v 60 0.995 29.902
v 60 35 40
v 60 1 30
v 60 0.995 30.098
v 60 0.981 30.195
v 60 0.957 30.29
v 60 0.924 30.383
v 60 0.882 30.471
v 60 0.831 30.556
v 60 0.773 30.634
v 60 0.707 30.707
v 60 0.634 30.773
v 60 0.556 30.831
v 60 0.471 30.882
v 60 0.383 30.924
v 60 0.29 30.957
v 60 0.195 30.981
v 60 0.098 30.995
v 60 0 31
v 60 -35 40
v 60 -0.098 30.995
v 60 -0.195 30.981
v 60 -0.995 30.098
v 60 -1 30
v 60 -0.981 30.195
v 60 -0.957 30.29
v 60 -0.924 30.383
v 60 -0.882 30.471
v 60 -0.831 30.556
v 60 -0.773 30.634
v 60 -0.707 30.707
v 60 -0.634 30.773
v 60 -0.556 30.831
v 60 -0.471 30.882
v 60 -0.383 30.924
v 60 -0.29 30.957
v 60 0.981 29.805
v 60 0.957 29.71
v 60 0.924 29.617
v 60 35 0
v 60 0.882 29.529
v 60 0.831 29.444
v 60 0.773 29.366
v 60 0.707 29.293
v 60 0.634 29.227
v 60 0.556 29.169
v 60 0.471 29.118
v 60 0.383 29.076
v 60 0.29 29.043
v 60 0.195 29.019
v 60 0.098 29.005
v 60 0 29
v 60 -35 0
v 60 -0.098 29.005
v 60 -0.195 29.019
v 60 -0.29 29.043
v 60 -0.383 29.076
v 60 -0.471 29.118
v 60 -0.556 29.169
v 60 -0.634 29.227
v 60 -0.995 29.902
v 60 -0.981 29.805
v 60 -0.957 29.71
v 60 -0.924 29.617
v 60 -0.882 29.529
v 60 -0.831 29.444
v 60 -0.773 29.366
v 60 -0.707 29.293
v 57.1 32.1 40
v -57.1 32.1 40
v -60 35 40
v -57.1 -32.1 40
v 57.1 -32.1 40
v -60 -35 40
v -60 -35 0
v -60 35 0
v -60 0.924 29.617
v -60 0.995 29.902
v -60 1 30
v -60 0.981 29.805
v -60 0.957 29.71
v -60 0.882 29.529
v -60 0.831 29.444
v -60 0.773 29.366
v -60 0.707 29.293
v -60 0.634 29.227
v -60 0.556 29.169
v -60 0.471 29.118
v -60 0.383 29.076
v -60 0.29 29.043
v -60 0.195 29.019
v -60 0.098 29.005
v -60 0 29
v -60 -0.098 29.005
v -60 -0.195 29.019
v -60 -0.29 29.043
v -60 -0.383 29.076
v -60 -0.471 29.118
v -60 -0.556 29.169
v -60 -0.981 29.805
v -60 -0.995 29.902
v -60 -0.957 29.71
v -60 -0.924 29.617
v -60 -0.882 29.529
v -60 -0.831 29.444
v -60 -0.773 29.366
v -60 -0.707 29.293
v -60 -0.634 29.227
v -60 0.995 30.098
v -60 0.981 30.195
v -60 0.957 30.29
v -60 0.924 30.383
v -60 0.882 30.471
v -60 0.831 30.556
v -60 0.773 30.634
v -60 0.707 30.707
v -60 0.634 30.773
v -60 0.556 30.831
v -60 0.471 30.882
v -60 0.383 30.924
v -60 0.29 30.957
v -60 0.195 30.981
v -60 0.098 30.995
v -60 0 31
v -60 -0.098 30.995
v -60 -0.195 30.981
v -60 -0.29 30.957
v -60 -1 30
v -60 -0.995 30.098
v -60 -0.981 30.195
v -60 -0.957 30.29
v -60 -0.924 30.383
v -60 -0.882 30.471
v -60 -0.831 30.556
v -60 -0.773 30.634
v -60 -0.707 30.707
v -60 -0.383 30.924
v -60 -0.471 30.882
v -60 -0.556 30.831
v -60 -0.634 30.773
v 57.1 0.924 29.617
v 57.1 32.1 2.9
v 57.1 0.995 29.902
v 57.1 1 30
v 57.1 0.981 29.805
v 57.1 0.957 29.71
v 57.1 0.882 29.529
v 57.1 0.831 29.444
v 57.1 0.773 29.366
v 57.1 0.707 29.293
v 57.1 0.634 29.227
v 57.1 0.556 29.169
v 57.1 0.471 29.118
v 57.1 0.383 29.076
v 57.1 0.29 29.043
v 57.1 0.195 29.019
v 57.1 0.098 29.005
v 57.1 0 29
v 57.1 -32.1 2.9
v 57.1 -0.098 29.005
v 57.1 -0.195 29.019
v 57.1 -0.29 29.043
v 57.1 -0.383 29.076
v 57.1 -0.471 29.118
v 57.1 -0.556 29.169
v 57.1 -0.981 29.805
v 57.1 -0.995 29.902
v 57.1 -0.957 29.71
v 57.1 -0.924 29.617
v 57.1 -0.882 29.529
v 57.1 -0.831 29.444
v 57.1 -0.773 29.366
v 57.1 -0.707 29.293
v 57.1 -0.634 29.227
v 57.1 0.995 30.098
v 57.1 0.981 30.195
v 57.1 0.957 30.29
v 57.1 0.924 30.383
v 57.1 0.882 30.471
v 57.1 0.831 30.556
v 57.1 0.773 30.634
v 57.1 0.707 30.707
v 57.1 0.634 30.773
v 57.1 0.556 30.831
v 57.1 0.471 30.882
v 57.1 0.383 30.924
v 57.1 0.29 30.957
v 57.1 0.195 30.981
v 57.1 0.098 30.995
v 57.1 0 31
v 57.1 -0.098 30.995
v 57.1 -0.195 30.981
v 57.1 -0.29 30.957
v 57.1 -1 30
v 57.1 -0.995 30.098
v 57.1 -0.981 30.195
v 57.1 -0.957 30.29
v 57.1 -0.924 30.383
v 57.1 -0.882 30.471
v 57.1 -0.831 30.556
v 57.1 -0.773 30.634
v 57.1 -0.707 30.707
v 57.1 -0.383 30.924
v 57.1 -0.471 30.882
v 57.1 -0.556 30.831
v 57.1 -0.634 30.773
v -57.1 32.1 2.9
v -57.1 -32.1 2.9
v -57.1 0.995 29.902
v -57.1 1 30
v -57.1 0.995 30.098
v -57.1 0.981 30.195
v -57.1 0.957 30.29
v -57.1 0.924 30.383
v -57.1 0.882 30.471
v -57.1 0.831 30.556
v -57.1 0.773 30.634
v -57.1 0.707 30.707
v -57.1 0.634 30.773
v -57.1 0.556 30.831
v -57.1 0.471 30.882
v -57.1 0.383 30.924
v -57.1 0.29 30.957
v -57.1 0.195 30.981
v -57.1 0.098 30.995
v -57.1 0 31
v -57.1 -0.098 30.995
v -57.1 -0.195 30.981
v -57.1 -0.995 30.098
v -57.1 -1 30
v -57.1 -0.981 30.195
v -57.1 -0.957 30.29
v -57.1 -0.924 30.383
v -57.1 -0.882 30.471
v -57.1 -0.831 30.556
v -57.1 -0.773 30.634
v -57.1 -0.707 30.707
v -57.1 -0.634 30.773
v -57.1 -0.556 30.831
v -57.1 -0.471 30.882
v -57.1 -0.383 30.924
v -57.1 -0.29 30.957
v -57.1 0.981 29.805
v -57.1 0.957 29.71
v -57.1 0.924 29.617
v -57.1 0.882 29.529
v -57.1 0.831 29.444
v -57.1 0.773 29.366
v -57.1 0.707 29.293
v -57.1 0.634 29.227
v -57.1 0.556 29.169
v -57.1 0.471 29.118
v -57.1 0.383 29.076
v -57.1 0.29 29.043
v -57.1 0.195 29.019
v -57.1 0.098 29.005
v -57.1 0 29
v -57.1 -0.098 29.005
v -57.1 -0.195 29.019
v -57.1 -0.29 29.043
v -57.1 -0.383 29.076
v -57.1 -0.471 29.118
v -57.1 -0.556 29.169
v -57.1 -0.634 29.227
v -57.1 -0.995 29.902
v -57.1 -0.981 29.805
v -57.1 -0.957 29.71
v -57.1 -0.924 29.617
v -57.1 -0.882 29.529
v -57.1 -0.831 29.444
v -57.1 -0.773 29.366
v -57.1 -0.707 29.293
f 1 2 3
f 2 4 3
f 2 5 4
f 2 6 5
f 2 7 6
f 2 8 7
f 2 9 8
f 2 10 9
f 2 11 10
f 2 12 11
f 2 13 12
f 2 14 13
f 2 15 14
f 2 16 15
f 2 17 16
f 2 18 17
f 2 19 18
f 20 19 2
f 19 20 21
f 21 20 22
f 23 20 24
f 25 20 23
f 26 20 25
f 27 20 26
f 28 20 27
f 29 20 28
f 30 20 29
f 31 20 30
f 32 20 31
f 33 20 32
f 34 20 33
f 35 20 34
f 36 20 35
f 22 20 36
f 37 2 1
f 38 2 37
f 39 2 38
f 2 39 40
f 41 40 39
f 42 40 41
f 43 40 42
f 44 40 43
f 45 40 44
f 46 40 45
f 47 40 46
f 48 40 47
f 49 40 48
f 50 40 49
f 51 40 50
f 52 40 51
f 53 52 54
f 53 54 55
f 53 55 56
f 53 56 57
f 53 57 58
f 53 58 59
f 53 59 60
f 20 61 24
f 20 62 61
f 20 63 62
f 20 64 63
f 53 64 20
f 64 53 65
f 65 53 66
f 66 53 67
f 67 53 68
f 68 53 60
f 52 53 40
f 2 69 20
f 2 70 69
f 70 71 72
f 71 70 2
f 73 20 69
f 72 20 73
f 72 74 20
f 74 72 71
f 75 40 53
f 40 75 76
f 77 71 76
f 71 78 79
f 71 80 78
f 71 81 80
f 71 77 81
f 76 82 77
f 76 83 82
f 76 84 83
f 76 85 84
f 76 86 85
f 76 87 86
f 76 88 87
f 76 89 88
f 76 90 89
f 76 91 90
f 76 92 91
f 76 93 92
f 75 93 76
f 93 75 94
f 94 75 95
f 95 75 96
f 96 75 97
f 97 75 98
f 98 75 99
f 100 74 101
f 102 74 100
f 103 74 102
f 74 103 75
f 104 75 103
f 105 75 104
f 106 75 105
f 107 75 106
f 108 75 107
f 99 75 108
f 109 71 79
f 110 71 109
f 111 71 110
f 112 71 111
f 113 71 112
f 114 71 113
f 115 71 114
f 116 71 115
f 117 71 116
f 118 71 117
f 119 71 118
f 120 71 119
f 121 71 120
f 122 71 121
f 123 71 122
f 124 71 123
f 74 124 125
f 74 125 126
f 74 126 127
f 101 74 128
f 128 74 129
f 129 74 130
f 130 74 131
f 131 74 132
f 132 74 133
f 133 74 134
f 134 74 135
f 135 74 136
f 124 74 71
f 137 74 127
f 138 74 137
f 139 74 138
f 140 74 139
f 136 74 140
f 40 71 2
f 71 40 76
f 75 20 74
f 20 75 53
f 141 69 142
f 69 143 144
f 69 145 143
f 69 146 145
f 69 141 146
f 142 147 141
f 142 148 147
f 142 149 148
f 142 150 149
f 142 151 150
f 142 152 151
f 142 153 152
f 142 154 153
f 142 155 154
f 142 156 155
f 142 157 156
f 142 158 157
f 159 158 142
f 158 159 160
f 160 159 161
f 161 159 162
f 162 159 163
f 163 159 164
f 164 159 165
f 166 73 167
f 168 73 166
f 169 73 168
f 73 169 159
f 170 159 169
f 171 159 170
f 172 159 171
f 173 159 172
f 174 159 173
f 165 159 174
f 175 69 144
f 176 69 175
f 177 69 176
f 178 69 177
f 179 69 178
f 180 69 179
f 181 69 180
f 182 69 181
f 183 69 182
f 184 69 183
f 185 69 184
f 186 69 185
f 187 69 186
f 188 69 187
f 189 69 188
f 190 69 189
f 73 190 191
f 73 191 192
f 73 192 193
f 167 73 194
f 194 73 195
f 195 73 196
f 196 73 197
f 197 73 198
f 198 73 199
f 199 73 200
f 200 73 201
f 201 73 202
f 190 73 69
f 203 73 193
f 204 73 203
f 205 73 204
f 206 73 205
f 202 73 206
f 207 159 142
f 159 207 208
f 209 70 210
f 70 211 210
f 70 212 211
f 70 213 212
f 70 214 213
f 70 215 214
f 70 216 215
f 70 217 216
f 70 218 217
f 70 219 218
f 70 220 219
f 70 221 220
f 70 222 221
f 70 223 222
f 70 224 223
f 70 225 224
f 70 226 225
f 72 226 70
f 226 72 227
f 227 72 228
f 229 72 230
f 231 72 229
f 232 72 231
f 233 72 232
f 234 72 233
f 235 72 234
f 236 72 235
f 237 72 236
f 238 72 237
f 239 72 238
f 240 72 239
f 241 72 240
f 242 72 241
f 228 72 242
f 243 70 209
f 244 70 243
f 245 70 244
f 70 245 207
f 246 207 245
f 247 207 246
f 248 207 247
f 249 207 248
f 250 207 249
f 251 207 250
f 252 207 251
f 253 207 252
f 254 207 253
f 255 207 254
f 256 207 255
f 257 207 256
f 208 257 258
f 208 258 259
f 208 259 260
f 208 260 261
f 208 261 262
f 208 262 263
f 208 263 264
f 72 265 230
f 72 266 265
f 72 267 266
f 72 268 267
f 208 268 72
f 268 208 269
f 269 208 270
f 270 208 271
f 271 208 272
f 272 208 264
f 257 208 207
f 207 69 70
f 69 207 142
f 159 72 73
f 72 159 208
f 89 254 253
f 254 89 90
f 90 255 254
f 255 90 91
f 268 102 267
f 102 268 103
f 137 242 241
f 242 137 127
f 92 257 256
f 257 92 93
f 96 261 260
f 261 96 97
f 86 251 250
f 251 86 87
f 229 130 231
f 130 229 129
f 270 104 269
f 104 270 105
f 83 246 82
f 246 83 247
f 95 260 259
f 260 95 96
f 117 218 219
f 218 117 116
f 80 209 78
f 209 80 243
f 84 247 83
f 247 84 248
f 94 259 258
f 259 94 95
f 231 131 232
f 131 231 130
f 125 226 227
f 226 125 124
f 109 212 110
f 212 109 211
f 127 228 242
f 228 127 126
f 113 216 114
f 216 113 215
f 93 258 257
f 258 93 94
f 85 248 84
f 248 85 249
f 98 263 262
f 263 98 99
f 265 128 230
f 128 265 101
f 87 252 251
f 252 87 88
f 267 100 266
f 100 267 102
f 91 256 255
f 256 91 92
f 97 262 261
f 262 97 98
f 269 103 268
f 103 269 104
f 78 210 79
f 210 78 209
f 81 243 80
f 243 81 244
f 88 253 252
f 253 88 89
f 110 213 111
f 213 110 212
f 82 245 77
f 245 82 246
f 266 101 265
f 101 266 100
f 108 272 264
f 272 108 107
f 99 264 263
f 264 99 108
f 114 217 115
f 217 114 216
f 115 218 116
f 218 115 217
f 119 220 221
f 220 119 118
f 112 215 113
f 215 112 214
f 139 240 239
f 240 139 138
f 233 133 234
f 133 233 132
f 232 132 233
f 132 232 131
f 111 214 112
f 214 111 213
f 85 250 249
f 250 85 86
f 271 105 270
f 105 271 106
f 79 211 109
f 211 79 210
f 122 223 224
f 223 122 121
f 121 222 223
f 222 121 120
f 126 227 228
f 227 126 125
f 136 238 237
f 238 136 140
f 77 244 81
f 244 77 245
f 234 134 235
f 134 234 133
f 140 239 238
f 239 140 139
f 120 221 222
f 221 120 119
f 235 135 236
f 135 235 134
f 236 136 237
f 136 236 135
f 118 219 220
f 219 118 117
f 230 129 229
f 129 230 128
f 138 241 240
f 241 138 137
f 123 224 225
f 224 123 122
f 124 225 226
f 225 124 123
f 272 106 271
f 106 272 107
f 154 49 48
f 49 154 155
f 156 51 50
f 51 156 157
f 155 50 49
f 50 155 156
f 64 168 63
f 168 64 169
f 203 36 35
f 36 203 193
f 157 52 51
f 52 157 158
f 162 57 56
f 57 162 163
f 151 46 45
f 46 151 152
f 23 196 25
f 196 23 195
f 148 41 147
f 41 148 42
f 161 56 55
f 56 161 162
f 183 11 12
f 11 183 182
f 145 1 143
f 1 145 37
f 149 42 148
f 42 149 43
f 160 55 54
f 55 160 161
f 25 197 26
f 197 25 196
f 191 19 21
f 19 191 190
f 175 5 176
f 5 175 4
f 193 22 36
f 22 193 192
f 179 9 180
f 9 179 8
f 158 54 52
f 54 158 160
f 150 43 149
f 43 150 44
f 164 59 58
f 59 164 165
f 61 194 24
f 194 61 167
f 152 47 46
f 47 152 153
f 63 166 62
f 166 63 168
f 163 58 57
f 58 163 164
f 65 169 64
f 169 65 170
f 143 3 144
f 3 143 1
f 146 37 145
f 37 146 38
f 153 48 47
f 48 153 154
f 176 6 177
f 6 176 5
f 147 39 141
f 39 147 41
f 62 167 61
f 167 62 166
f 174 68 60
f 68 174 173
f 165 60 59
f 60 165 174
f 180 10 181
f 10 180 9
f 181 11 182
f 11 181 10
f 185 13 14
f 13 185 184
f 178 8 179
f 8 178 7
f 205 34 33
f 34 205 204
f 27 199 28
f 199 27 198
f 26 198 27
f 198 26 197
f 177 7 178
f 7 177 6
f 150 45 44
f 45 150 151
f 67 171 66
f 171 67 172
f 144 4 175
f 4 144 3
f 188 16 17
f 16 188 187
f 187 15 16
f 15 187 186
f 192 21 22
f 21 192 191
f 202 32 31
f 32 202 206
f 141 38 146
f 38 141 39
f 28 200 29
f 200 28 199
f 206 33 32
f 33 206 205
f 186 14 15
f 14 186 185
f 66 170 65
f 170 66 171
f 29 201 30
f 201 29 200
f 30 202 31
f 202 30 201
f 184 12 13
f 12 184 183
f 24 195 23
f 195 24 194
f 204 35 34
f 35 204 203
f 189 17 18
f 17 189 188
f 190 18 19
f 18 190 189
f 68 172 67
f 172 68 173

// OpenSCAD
// Parameters (mm)
outer_x = 120;               // outer dimension X
outer_y = 70;                // outer dimension Y
outer_z = 40;                // outer dimension Z (height)
wall_thick = 3;              // wall thickness
floor_thick = 3;             // floor thickness

inner_x = outer_x - 2*wall_thick;   // inner cavity X
inner_y = outer_y - 2*wall_thick;   // inner cavity Y
inner_z = outer_z - floor_thick;    // inner cavity Z (open top)

platform_len = 60;           // platform length in X
platform_top_z = 13;         // absolute Z of platform top
platform_bottom_z = floor_thick; // absolute Z of inner floor
platform_thick = platform_top_z - platform_bottom_z; // platform thickness

hole_d = 2;                  // electrode hole diameter
hole_r = hole_d/2;
hole_z = 30;                 // absolute Z of hole centre
hole_y = 0;                  // absolute Y of hole centre (center line)

// Set resolution for curved features
$fn = 64;

// Main model
difference() {
    // Tank shell (outer solid minus inner cavity)
    difference() {
        // outer solid, centred on origin
        translate([-outer_x/2, -outer_y/2, 0])
            cube([outer_x, outer_y, outer_z]);

        // inner cavity, slightly oversized to avoid coplanar faces
        translate([-inner_x/2 - 0.1, -inner_y/2 - 0.1, floor_thick - 0.1])
            cube([inner_x + 0.2, inner_y + 0.2, inner_z + 0.2]);
    }

    // Platform (solid raised tray)
    translate([-platform_len/2, -inner_y/2, floor_thick])
        cube([platform_len, inner_y, platform_thick]);

    // Electrode holes through each end wall
    // Left wall hole
    translate([-(outer_x/2) + wall_thick/2, hole_y, hole_z])
        rotate([0, 90, 0])
            cylinder(h = wall_thick + 0.2, r = hole_r, center = true);

    // Right wall hole
    translate([(outer_x/2) - wall_thick/2, hole_y, hole_z])
        rotate([0, 90, 0])
            cylinder(h = wall_thick + 0.2, r = hole_r, center = true);
}
